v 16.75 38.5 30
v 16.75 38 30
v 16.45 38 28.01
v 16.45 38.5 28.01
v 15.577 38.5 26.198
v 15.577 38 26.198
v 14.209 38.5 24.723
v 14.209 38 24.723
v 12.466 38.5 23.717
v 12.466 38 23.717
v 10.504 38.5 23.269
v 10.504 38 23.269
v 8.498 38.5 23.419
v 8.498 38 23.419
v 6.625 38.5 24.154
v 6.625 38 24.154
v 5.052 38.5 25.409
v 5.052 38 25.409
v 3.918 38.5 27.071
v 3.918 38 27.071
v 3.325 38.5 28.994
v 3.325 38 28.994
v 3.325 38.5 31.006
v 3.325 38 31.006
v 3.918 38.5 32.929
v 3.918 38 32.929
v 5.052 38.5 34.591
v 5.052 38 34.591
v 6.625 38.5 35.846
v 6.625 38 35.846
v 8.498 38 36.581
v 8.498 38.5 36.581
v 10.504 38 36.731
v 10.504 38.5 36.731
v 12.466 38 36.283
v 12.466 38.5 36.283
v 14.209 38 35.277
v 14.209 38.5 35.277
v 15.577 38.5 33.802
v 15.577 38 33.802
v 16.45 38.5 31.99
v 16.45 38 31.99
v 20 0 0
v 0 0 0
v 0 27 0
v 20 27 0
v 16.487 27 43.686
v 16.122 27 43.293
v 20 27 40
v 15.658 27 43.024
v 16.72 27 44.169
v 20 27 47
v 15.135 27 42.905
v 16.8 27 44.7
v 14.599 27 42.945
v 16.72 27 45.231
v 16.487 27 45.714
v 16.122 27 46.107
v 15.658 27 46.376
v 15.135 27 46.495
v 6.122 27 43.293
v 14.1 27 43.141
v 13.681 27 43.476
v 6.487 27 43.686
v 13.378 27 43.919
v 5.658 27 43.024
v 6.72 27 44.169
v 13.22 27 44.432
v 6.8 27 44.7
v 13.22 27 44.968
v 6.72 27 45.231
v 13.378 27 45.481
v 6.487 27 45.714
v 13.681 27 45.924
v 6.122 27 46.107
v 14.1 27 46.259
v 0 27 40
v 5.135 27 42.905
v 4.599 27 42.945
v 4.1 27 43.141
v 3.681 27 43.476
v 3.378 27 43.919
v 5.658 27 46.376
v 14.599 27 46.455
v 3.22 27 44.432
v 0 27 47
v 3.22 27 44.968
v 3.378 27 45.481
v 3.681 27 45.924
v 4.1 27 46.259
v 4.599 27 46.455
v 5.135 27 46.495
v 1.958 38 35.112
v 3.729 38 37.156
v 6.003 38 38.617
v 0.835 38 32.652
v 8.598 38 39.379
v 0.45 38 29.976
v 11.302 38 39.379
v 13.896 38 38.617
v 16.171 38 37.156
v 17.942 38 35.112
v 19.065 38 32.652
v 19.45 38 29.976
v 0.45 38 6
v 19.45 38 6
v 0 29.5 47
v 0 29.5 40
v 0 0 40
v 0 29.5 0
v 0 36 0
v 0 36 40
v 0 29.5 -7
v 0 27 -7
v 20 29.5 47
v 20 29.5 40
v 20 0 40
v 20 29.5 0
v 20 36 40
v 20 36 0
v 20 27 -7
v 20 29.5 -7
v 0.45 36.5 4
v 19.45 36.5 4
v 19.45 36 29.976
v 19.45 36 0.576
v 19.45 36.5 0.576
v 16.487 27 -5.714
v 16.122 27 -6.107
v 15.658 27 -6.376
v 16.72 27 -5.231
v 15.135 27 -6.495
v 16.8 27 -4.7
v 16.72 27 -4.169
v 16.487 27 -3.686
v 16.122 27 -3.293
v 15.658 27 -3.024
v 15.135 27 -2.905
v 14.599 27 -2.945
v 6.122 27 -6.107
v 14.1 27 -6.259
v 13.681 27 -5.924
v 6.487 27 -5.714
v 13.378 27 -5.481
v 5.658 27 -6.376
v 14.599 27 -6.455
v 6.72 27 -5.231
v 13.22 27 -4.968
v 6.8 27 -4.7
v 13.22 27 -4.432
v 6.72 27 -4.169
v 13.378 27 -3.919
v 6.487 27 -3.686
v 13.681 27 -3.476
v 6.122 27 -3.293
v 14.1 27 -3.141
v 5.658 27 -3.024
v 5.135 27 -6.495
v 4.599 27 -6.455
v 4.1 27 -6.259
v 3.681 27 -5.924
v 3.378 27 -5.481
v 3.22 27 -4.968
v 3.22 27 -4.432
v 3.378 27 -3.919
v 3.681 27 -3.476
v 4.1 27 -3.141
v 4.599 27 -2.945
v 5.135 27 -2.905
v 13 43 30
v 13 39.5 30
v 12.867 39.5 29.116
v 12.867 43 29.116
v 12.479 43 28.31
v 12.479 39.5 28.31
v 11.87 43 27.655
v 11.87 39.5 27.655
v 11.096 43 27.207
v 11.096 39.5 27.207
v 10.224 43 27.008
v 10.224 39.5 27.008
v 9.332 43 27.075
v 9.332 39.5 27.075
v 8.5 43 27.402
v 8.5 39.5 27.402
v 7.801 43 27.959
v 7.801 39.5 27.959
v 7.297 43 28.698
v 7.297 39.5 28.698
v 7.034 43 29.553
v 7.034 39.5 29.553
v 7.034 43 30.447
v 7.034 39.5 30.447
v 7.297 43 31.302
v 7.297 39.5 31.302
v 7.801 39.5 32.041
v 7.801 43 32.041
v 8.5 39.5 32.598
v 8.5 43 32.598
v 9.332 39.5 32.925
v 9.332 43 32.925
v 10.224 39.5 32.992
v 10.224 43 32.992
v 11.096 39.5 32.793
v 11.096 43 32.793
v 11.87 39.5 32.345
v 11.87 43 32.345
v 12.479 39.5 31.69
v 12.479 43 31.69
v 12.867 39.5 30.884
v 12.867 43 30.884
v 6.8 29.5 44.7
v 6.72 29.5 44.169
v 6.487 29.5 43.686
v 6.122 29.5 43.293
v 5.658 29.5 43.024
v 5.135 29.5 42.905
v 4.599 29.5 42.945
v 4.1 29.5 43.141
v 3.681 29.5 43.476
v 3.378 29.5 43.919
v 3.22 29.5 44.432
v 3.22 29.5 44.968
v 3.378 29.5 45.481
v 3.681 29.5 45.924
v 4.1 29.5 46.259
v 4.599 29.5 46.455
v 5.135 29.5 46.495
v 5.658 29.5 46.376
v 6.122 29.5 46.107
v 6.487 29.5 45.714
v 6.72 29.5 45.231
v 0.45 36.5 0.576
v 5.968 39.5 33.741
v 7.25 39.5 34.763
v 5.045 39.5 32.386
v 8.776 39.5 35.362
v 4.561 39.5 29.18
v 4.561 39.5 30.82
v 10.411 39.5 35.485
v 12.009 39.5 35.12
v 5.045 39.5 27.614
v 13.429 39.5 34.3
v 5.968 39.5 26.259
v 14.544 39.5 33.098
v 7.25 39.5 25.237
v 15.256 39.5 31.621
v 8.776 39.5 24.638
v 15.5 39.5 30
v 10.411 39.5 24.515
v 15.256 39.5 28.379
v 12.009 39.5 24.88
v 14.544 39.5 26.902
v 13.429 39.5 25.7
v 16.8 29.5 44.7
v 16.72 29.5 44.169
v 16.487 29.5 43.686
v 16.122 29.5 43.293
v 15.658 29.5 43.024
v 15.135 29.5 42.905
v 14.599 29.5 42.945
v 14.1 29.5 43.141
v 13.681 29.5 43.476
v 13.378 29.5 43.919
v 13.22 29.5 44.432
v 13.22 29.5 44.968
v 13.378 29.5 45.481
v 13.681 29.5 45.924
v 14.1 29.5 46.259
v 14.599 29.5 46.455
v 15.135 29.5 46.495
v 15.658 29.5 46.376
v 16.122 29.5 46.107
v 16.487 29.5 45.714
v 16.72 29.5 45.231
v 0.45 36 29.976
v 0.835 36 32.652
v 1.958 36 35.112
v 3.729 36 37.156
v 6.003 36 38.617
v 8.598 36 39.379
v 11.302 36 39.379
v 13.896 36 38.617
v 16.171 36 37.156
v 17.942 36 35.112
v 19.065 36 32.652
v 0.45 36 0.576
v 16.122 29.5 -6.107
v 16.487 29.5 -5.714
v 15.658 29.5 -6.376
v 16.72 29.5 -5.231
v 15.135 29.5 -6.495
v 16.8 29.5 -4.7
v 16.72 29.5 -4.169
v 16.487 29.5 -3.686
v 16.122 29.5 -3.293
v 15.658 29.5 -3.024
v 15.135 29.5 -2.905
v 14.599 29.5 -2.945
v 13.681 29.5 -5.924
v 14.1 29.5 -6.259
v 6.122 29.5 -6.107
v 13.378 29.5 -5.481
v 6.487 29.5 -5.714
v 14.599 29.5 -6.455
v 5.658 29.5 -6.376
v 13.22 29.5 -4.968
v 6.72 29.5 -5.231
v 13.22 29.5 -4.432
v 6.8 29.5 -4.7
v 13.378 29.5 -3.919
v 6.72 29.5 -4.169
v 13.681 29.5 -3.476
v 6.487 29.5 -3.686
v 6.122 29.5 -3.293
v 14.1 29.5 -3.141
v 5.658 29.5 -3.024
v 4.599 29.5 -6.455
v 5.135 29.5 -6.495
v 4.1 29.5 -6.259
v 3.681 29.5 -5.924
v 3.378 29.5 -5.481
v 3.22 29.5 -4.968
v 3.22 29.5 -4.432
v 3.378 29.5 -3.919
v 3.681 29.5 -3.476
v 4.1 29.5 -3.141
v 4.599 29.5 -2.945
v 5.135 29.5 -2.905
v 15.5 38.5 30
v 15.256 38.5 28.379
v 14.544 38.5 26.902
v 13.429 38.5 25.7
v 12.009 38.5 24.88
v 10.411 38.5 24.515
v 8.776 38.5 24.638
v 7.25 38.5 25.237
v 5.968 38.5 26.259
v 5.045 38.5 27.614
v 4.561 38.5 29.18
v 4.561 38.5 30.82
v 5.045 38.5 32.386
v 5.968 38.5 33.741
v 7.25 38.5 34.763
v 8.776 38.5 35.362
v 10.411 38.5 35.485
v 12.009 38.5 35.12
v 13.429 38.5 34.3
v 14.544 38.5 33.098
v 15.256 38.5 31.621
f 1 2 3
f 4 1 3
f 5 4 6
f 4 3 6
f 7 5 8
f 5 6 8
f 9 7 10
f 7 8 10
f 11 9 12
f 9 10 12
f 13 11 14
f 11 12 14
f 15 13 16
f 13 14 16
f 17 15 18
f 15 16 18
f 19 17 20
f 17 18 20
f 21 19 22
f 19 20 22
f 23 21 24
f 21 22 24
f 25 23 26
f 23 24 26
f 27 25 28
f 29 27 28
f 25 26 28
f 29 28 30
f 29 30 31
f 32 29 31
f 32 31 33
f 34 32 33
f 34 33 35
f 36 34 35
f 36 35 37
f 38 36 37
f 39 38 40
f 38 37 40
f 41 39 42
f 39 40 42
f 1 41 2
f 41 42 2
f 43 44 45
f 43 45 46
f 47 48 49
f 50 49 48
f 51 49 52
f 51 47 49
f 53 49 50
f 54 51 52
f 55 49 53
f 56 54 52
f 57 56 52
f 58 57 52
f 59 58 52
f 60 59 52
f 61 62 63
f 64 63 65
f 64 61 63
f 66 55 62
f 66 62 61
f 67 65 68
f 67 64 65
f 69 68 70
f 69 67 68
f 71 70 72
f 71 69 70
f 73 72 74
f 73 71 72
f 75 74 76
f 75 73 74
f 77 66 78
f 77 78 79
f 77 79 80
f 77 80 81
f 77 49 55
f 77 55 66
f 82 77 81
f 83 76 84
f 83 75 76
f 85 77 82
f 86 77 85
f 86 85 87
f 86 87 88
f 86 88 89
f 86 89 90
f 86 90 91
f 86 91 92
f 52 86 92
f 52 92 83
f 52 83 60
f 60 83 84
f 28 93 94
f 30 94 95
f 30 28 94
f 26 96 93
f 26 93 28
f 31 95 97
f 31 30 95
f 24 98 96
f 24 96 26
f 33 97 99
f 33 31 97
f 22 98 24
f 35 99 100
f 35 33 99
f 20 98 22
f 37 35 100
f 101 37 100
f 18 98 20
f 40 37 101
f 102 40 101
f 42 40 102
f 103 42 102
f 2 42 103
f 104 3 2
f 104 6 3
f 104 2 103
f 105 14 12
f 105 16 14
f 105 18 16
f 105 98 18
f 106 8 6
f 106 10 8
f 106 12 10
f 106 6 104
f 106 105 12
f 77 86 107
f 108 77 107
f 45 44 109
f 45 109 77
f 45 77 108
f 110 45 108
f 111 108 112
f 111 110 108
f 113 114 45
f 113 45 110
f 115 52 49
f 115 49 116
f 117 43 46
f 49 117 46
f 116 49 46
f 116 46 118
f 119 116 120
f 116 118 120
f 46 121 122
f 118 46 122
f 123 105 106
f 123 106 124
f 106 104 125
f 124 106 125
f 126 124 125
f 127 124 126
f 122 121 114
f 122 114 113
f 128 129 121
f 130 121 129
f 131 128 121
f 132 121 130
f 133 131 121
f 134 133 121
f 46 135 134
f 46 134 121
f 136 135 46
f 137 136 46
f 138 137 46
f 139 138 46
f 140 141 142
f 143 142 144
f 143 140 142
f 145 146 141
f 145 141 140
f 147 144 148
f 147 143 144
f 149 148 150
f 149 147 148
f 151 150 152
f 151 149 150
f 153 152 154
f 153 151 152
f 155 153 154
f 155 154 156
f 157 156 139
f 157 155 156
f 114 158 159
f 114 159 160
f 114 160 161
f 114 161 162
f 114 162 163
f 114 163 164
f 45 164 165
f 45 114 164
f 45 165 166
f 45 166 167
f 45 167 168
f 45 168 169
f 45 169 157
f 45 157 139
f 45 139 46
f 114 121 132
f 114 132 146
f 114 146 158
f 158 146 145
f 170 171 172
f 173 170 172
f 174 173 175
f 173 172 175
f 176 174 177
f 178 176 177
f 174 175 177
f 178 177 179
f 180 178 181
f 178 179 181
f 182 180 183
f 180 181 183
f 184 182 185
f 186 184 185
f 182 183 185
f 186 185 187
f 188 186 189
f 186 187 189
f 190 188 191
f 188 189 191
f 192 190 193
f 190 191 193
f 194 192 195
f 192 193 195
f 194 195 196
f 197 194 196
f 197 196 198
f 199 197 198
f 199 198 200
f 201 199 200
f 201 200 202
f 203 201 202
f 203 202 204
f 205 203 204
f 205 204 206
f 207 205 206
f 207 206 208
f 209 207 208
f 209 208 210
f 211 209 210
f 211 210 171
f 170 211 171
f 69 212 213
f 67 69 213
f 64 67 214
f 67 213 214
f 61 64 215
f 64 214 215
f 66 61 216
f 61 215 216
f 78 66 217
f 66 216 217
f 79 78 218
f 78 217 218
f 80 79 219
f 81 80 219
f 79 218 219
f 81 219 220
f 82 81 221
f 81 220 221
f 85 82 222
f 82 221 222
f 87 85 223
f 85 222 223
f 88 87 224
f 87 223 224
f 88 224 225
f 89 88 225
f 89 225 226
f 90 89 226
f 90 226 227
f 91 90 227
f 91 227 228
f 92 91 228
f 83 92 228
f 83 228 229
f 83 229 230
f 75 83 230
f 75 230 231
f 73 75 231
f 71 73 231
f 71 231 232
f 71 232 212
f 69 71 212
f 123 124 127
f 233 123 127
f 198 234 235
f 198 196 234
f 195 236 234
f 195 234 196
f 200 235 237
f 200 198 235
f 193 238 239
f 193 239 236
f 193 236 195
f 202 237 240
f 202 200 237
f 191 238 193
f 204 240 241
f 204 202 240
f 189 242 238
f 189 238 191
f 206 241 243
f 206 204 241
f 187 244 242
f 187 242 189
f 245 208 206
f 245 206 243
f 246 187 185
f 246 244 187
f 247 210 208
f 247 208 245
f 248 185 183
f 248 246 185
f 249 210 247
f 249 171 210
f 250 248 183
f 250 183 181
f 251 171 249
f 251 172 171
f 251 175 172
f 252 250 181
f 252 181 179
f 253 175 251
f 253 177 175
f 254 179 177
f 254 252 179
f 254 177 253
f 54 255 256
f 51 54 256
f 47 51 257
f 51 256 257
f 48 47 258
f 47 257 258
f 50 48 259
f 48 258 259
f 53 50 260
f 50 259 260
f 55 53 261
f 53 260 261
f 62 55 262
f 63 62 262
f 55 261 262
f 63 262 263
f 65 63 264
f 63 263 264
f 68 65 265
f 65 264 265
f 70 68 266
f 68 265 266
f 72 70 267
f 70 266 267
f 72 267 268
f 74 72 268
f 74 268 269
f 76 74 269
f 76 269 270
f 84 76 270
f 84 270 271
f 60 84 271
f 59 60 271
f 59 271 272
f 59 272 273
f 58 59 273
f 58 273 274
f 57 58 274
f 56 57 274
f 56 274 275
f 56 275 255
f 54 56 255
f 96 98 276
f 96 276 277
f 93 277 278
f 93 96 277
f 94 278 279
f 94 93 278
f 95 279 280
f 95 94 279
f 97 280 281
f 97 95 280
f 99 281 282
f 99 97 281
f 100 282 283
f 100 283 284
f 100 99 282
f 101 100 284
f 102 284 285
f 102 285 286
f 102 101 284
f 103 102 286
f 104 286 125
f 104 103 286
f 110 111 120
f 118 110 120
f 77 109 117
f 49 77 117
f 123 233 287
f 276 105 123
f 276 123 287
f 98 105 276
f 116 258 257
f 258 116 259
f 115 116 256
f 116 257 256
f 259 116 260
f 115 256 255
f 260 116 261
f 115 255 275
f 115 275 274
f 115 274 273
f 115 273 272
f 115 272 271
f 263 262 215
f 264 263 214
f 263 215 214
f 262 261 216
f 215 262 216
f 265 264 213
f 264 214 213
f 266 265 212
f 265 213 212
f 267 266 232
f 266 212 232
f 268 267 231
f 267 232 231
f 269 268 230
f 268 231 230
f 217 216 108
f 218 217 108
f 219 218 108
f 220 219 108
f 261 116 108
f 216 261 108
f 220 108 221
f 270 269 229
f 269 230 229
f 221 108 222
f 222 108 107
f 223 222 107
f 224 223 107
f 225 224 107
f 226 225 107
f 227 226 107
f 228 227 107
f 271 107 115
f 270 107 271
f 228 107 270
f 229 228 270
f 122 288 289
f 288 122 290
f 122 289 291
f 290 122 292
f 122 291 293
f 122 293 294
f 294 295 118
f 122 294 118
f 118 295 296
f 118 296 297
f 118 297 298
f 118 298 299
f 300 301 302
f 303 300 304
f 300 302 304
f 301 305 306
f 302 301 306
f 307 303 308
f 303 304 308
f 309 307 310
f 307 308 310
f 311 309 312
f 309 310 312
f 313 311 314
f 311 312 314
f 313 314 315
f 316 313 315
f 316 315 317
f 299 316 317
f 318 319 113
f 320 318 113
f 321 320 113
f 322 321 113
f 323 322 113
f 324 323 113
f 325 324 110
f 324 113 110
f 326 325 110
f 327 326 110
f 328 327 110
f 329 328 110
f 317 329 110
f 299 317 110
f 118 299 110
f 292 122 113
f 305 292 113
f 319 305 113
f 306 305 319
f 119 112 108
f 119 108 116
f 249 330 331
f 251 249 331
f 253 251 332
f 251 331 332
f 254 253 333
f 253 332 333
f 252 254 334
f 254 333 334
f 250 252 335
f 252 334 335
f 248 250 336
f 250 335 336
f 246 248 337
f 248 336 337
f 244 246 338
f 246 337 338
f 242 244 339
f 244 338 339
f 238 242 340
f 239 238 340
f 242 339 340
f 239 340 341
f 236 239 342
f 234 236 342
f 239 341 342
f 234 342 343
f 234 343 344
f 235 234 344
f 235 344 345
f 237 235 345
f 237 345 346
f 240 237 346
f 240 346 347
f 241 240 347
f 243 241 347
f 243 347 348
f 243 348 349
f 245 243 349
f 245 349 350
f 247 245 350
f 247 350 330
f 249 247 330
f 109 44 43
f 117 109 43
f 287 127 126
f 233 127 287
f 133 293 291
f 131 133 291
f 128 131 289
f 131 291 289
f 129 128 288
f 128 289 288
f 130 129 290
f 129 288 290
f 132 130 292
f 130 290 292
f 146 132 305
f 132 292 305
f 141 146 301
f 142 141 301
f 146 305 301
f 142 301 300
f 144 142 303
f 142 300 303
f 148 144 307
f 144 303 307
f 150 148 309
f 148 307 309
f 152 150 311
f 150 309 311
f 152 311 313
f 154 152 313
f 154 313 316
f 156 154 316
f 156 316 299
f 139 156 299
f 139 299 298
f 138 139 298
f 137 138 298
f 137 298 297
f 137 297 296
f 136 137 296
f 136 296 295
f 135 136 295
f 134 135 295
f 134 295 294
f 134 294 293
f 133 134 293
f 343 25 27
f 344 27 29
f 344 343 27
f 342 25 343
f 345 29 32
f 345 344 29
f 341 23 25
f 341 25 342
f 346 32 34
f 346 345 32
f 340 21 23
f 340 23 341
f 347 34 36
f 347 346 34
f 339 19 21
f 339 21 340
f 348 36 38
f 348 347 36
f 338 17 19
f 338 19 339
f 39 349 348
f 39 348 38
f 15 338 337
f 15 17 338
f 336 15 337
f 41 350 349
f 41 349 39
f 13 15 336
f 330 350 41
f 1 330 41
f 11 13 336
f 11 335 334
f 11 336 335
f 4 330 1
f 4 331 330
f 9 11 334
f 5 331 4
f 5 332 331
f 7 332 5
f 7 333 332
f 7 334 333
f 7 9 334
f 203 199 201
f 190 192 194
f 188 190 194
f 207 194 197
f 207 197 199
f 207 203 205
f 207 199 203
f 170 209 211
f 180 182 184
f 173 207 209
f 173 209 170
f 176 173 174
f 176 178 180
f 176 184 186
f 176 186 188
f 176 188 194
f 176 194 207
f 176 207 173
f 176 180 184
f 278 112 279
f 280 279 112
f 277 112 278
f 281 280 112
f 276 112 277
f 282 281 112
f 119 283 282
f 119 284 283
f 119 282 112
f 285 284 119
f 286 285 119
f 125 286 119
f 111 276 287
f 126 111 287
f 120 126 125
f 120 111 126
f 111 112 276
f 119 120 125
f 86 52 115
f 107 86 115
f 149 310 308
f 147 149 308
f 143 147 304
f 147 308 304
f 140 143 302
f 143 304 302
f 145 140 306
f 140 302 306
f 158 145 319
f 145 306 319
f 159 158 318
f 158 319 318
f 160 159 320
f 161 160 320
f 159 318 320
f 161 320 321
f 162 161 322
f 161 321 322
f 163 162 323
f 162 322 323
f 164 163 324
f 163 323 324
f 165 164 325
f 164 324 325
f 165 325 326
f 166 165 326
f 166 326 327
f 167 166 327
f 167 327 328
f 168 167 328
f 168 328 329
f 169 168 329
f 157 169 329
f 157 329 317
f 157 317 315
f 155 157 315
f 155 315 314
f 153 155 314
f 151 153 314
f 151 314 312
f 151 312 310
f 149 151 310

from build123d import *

# Parameters (mm, degrees)
SKETCH1_W           = 20
SKETCH1_H           = 38
BOSS_EXTRUDE1_DEPTH = 40
SKETCH2_W           = 7
SKETCH2_H           = 2.5
BOSS_EXTRUDE2_DEPTH = 20
CUT_EXTRUDE1_DEPTH  = 40
SKETCH4_R           = 1.8
CUT_EXTRUDE2_DEPTH  = 10
SKETCH5_W           = 20
SKETCH5_H           = 40
CUT_EXTRUDE3_DEPTH  = 2
SKETCH6_R           = 6.75
SKETCH6_R_2         = 5.5
BOSS_EXTRUDE3_DEPTH = 0.5
SKETCH6_4_R         = 5.5
SKETCH6_4_R_2       = 3
BOSS_EXTRUDE4_DEPTH = 1.5
SKETCH6_5_R         = 3
BOSS_EXTRUDE5_DEPTH = 5


with BuildPart() as part:
    # Sketch1 → Boss-Extrude1 (new body)
    with BuildSketch(Plane.XY):
        with Locations((10, 19)):
            Rectangle(SKETCH1_W, SKETCH1_H)
    extrude(amount=BOSS_EXTRUDE1_DEPTH)

    # Sketch2 → Boss-Extrude2 (add)
    with BuildSketch(Plane.ZY):
        with Locations((-3.5, 28.25)):
            Rectangle(SKETCH2_W, SKETCH2_H)
        with Locations((43.5, 28.25)):
            Rectangle(SKETCH2_W, SKETCH2_H)
    extrude(amount=-BOSS_EXTRUDE2_DEPTH)

    # Sketch3 → Cut-Extrude1 (cut)
    with BuildSketch(Plane.ZY):
        Polygon((6, 38), (4, 36.5), (0, 36.5), (0, 38), align=None)
    extrude(amount=-CUT_EXTRUDE1_DEPTH, mode=Mode.SUBTRACT)

    # Sketch4 → Cut-Extrude2 (cut)
    with BuildSketch(Plane(origin=(0, 29.5, 0), x_dir=(1, 0, 0), z_dir=(0, 1, 0))):
        with Locations((15, -44.7)):
            Circle(SKETCH4_R)
        with Locations((5, -44.7)):
            Circle(SKETCH4_R)
        with Locations((15, 4.7)):
            Circle(SKETCH4_R)
        with Locations((5, 4.7)):
            Circle(SKETCH4_R)
    extrude(amount=-CUT_EXTRUDE2_DEPTH, mode=Mode.SUBTRACT)

    # Sketch5 → Cut-Extrude3 (cut)
    with BuildSketch(Plane(origin=(0, 38, 0), x_dir=(1, 0, 0), z_dir=(0, 1, 0))):
        with Locations((10, -20)):
            Rectangle(SKETCH5_W, SKETCH5_H)
        with BuildLine():
            Line((19.449743203, -29.975974241), (19.449743203, -0.575747889))
            Line((19.449743203, -0.575747889), (0.449743203, -0.575747889))
            Line((0.449743203, -0.575747889), (0.449743203, -29.975974241))
            ThreePointArc((0.449743203, -29.975974241), (9.949743203, -39.475974241), (19.449743203, -29.975974241))
        make_face(mode=Mode.SUBTRACT)
    extrude(amount=-CUT_EXTRUDE3_DEPTH, mode=Mode.SUBTRACT)

    # Sketch6 → Boss-Extrude3 (add)
    with BuildSketch(Plane(origin=(0, 38, 0), x_dir=(1, 0, 0), z_dir=(0, 1, 0))):
        with Locations((10, -30)):
            Circle(SKETCH6_R)
        with Locations((10, -30)):
            Circle(SKETCH6_R_2, mode=Mode.SUBTRACT)
    extrude(amount=BOSS_EXTRUDE3_DEPTH)

    # Sketch6<4> → Boss-Extrude4 (add)
    with BuildSketch(Plane(origin=(0, 38, 0), x_dir=(1, 0, 0), z_dir=(0, 1, 0))):
        with Locations((10, -30)):
            Circle(SKETCH6_4_R)
        with Locations((10, -30)):
            Circle(SKETCH6_4_R_2, mode=Mode.SUBTRACT)
    extrude(amount=BOSS_EXTRUDE4_DEPTH)

    # Sketch6<5> → Boss-Extrude5 (add)
    with BuildSketch(Plane(origin=(0, 38, 0), x_dir=(1, 0, 0), z_dir=(0, 1, 0))):
        with Locations((10, -30)):
            Circle(SKETCH6_5_R)
    extrude(amount=BOSS_EXTRUDE5_DEPTH)


solid = part.part
